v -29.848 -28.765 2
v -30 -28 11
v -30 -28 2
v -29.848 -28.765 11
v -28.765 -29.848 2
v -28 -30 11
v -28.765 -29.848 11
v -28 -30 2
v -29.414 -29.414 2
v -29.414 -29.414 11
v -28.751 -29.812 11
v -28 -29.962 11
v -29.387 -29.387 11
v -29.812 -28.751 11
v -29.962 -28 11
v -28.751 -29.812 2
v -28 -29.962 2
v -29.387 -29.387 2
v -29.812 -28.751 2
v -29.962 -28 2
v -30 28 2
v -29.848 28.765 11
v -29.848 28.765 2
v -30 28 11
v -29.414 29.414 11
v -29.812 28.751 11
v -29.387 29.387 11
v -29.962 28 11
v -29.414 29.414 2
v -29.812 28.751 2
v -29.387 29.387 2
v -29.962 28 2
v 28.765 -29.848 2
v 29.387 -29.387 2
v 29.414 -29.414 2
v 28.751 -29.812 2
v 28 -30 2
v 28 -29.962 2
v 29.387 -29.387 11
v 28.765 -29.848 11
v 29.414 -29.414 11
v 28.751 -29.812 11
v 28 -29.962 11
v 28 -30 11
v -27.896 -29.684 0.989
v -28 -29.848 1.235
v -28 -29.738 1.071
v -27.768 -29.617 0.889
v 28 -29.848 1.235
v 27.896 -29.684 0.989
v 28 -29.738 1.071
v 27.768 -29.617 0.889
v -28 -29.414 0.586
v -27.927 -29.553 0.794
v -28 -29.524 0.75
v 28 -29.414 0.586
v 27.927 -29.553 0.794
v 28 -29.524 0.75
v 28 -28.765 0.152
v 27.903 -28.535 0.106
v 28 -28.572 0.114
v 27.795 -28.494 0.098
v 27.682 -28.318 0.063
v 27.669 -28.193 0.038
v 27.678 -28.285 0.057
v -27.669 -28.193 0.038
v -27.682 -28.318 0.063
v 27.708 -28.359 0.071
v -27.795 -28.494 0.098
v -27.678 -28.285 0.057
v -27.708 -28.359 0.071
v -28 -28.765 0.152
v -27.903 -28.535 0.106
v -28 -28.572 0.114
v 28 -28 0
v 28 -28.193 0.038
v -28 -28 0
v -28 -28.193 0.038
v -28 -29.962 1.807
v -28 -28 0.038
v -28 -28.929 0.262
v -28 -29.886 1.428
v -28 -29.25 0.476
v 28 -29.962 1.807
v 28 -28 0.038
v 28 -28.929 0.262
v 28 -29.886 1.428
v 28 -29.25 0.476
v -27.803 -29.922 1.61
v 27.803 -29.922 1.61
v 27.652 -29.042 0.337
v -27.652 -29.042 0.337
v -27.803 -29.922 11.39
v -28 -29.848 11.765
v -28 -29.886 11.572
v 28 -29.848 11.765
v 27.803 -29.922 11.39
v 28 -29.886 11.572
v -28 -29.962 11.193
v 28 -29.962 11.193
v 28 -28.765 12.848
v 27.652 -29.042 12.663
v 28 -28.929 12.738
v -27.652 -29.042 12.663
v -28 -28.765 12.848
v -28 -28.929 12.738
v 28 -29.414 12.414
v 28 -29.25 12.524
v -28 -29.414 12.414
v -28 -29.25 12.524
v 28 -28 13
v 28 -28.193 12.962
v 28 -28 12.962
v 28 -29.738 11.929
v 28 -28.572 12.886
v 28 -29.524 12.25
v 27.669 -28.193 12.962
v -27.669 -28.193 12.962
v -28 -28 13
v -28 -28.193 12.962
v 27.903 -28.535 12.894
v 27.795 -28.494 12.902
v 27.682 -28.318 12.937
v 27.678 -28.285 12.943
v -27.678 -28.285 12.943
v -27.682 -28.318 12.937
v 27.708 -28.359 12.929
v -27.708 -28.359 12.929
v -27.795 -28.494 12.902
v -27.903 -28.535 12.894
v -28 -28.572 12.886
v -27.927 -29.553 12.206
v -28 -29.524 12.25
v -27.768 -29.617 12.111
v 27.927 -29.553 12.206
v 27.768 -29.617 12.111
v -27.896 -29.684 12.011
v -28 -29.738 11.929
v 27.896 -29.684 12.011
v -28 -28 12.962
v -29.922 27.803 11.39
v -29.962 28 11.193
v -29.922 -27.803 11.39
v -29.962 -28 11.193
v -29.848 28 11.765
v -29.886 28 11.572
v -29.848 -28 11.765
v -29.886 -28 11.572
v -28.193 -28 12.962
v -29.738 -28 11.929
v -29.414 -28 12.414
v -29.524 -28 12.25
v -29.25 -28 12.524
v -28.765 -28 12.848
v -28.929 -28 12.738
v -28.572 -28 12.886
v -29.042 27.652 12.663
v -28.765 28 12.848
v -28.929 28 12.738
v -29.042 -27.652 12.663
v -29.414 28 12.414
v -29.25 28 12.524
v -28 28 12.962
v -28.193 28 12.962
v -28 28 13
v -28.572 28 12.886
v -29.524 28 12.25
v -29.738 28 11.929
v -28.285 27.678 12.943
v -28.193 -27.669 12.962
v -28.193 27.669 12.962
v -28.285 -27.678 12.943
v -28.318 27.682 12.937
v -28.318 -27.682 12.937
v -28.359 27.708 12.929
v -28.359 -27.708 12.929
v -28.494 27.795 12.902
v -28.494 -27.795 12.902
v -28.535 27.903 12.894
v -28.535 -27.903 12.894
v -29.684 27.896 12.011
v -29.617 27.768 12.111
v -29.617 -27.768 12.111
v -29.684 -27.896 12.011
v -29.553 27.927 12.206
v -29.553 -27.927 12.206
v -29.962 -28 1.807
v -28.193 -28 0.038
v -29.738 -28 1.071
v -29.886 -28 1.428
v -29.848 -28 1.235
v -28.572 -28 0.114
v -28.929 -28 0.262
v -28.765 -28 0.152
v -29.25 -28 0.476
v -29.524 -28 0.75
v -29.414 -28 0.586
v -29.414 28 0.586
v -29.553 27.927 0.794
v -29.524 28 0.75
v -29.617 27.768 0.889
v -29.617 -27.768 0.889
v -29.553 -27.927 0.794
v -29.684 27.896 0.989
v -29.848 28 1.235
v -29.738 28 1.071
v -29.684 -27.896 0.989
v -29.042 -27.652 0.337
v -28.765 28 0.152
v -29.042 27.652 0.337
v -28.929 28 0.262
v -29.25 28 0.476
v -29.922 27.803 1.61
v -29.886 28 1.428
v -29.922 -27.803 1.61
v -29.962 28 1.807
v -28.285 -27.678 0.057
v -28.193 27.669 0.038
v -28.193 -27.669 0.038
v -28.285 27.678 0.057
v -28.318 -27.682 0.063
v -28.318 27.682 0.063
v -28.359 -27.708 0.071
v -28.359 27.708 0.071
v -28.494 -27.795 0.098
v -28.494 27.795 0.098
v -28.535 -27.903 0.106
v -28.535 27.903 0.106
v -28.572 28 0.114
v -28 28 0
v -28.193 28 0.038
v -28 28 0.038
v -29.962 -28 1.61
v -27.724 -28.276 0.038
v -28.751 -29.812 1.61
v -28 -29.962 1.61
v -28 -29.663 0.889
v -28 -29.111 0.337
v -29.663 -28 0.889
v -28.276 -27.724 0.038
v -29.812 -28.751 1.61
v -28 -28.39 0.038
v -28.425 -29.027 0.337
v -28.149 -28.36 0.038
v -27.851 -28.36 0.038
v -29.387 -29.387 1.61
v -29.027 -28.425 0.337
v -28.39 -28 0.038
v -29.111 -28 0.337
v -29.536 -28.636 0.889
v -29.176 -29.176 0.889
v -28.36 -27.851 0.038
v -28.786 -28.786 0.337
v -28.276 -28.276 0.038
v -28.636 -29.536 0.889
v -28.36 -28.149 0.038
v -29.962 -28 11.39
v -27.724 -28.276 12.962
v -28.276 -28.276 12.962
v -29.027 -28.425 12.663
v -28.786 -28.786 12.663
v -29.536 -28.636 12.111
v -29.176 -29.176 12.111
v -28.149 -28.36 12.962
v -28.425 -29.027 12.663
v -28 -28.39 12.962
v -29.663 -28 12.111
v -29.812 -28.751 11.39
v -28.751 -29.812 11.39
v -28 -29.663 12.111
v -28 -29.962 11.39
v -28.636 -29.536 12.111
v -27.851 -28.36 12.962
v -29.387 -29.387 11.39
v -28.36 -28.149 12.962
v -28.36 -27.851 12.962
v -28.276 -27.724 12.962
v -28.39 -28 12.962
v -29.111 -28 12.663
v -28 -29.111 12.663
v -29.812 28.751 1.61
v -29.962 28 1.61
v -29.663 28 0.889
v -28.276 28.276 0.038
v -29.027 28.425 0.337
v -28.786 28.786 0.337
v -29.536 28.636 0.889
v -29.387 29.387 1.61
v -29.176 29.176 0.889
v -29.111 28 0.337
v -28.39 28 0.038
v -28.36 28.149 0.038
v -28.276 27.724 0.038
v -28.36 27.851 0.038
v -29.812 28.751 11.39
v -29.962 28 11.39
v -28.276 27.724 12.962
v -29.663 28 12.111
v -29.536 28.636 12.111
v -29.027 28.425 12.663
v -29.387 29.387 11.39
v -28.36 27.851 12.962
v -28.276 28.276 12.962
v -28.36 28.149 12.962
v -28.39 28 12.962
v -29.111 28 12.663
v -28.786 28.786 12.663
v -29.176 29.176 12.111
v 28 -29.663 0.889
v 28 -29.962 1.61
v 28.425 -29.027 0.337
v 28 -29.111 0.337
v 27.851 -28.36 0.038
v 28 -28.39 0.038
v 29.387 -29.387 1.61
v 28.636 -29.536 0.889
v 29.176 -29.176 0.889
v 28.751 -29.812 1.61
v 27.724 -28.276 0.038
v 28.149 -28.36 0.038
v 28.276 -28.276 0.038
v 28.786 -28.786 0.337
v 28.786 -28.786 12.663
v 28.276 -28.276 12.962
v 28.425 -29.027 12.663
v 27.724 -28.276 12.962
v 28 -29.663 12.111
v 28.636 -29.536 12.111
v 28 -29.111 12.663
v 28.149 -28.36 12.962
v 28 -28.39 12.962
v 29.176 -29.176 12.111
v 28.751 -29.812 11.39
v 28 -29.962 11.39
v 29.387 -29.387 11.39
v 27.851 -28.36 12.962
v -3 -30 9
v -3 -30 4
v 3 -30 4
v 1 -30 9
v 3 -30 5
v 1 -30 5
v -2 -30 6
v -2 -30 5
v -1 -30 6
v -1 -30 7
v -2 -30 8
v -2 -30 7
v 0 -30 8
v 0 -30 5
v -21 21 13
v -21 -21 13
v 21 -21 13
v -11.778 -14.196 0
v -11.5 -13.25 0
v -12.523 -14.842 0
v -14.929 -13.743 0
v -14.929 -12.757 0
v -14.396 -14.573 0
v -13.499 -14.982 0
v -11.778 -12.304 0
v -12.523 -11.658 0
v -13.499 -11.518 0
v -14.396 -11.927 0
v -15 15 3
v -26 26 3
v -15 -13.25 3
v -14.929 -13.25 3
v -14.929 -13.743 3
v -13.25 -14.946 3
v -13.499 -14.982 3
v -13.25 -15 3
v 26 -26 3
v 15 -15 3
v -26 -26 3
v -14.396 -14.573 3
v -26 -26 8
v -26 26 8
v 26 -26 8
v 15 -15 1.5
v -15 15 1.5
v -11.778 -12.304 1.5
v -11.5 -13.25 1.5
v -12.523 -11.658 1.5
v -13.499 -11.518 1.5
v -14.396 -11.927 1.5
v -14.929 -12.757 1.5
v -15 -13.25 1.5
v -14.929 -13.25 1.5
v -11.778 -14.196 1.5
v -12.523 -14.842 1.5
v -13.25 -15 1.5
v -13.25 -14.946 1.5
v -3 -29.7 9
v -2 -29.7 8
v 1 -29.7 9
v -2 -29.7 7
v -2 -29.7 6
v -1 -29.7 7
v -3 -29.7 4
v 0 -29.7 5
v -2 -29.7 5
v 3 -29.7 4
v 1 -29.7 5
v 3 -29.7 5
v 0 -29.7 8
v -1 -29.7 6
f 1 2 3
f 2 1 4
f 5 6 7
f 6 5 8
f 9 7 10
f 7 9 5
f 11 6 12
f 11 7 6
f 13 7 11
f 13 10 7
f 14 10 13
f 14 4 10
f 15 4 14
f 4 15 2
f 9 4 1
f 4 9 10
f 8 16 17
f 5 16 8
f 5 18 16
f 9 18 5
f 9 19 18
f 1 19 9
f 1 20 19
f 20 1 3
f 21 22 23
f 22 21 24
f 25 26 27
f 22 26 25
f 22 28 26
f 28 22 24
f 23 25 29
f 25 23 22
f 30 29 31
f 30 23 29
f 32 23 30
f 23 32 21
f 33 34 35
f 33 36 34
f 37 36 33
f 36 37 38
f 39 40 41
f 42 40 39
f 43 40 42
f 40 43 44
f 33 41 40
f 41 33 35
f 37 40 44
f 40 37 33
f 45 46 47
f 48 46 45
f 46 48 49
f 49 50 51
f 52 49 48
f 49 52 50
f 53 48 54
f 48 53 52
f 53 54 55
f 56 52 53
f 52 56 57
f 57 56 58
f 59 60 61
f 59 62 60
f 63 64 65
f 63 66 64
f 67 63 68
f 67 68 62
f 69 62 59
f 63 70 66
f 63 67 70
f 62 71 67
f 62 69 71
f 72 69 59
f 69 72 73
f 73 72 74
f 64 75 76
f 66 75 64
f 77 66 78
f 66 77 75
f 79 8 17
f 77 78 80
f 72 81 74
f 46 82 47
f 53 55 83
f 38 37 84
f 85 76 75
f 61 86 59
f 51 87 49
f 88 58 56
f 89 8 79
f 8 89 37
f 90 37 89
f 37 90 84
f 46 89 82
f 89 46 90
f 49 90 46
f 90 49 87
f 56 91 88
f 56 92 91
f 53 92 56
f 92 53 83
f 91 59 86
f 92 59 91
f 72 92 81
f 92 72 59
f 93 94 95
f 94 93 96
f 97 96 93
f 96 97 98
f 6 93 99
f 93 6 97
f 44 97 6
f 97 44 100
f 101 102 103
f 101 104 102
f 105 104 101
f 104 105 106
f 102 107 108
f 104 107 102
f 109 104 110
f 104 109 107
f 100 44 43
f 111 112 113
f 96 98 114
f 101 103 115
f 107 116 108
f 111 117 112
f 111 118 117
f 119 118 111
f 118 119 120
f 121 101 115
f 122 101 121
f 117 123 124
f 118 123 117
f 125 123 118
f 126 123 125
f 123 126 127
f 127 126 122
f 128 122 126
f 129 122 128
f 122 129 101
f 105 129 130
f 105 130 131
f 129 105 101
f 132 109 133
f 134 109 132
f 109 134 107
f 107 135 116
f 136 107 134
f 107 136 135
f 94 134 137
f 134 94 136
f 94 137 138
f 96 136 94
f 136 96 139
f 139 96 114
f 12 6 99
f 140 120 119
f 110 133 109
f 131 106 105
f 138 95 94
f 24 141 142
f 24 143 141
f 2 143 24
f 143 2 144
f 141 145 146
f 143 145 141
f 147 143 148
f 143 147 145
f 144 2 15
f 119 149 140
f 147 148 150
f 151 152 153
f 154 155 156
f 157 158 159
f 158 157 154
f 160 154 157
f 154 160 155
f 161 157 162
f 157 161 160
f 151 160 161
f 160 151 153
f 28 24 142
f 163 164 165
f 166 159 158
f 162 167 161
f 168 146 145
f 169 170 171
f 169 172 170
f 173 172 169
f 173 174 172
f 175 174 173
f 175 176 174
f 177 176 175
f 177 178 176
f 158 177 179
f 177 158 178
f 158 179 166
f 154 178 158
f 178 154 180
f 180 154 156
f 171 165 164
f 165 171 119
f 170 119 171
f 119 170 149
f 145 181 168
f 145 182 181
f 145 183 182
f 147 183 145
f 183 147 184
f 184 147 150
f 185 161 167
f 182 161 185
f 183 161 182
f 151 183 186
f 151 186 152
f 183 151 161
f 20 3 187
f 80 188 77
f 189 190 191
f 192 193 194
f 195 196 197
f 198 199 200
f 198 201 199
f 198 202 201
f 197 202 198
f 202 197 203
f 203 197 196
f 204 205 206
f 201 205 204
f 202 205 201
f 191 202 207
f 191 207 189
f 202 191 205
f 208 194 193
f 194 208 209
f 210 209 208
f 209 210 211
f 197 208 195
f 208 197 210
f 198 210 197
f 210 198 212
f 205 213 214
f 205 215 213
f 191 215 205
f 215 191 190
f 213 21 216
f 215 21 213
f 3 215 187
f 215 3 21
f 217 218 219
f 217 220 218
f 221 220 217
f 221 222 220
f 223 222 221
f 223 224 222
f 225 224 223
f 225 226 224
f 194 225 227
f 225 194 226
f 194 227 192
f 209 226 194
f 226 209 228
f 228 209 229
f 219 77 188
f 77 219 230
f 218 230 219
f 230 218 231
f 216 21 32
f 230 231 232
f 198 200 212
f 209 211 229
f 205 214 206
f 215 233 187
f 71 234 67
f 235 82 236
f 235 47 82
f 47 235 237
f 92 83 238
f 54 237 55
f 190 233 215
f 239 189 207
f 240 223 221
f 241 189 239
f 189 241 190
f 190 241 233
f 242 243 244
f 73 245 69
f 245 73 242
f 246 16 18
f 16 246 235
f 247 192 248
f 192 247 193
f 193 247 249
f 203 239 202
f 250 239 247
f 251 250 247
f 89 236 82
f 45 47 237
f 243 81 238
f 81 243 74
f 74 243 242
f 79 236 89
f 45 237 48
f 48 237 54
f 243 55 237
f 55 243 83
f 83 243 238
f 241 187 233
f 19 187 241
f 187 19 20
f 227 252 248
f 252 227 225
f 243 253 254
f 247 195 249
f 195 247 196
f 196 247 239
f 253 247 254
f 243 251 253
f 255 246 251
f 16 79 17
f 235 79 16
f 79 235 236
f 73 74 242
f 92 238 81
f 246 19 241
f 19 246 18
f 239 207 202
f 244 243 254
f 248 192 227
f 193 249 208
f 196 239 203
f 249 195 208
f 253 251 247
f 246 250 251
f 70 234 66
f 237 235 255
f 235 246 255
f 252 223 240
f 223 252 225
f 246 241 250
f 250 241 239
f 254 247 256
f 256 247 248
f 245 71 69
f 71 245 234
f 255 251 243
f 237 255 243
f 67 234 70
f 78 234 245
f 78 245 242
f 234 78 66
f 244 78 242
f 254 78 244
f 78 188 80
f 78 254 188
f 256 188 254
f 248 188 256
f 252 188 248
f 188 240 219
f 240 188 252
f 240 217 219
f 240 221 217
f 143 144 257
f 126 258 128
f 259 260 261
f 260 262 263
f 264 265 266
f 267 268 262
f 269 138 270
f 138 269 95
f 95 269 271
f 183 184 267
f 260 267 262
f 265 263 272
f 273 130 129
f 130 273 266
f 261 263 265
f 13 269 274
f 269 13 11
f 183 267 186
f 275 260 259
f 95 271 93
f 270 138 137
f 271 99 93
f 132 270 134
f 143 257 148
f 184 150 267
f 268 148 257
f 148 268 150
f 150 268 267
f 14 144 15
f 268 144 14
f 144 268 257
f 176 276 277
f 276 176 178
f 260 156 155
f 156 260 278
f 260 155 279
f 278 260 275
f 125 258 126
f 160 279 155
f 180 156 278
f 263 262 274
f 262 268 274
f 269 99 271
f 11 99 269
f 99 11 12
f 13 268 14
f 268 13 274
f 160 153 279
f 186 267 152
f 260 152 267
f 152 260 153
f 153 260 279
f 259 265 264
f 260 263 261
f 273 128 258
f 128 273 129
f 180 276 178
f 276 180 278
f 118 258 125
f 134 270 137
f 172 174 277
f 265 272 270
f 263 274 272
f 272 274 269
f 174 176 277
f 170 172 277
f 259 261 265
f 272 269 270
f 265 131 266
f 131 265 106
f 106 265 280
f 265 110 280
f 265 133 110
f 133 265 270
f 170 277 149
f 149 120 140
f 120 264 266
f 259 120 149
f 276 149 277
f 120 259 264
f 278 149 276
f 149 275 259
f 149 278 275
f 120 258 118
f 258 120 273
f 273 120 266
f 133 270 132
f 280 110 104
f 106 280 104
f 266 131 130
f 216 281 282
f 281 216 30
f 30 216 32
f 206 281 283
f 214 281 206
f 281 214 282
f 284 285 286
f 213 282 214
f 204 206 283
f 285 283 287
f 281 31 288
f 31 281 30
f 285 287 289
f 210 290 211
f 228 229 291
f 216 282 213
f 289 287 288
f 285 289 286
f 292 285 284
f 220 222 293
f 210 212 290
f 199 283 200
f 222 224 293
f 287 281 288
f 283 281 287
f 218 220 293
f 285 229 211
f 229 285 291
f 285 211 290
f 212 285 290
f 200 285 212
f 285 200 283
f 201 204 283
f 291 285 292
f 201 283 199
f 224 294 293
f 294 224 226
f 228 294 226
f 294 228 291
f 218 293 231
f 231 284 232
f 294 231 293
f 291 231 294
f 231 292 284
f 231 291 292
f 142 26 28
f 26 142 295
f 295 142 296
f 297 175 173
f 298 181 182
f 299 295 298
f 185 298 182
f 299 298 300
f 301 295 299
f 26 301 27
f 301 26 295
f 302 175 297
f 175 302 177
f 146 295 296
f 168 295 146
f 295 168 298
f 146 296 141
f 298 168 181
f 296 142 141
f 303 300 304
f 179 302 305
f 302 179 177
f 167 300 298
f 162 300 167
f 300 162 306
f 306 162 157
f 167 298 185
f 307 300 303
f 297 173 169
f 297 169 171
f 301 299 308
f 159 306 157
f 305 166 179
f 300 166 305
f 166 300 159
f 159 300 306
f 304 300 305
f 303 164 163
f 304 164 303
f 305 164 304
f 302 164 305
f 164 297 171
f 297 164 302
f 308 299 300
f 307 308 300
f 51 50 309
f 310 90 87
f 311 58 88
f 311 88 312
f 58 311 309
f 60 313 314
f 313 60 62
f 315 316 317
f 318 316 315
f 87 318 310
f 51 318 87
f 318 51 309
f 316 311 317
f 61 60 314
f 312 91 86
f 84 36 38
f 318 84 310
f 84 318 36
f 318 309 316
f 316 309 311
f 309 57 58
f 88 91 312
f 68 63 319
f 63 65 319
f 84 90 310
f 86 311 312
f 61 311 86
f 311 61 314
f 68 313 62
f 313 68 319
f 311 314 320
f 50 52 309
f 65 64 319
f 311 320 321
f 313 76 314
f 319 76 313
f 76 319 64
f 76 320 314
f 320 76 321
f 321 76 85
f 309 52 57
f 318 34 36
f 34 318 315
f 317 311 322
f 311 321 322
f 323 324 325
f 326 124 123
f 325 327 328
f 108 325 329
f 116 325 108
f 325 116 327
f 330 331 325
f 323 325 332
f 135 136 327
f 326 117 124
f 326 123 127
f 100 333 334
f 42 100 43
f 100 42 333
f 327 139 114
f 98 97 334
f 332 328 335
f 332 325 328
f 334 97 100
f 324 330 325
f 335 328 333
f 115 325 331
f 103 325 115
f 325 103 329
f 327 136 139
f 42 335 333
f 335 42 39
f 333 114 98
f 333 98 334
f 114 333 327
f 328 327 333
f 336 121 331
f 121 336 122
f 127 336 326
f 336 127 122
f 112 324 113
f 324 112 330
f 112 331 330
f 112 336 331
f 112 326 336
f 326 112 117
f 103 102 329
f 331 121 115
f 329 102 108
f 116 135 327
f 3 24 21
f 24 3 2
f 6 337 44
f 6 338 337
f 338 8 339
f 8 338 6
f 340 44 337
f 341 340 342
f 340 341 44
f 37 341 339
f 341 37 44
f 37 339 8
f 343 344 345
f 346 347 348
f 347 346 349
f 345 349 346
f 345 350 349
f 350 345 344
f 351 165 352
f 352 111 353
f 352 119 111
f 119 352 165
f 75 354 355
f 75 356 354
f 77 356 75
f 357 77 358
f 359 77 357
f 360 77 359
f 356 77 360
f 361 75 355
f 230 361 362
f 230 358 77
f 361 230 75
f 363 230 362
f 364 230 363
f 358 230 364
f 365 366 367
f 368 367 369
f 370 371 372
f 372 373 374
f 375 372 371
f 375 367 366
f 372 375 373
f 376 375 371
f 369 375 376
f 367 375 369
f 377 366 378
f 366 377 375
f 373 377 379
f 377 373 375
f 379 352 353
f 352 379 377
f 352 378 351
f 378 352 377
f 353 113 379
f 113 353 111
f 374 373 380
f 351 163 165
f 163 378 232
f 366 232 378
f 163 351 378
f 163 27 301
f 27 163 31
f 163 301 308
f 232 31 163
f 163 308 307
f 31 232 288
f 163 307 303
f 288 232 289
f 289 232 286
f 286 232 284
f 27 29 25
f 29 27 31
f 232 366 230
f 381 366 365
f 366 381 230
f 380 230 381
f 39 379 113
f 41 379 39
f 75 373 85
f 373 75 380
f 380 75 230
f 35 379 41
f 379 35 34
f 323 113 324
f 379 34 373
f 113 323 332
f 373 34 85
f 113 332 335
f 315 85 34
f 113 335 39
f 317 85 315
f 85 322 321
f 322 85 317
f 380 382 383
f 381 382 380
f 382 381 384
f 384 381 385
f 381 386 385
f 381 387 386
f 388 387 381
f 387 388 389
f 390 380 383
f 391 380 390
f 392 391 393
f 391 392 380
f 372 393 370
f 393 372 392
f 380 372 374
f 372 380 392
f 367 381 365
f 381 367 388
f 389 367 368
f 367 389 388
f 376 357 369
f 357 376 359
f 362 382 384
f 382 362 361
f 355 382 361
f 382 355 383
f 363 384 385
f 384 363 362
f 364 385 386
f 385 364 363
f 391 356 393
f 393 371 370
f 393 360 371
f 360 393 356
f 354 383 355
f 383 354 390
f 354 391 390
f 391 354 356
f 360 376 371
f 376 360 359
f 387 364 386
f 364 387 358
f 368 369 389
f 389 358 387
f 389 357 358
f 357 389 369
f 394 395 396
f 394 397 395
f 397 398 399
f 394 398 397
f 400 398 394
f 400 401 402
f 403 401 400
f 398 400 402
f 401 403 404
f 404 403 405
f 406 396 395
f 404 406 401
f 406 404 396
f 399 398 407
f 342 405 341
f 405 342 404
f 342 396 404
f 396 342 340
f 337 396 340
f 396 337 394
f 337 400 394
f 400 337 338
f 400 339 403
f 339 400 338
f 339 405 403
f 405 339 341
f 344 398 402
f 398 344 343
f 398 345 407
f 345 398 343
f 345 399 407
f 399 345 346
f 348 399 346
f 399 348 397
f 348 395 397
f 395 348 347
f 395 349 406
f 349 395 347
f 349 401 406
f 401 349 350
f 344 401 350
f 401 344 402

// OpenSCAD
// Thickness of cord
T=1.5;
// Width of bracket
w=60;
// Thickness of wall
wall=4;
// Minimum thickness of picture sandwich
minT=5;
// Maximum thickness of picture sandwich
maxT=10;
// radius of rounded edges
r=2;

Dhole=T+2;

use <MCAD/boxes.scad>

difference(){
	translate([0,0,maxT/2+T])roundedBox([w,w,maxT+2*T],r,$fn=16);
	difference(){
		translate([0,0,maxT+2*T])cube([w-2*wall,w-2*wall,2*maxT],center=true);
		translate([-w/2,-w/2+wall,2*T+minT])rotate([45,0,0])cube([w,maxT,maxT]);
		translate([-w/2+wall,-w/2,2*T+minT])rotate([0,-45,0])cube([maxT,w,maxT]);
	}
	rotate([0,0,45])translate([0,-w,-1])cube(2*w);
	translate([Dhole/2,0,w/4+T])cube(w/2,center=true);
	translate([0,Dhole/2,w/4+T])cube(w/2,center=true);
	translate(-(w/4-Dhole/2)*[1,1,0])cylinder(r=Dhole/2,h=2*maxT,center=true,$fs=1);
	translate([0,-w/2,(maxT+2*T)/2])rotate([90,0,0])monogram(h=0.6);
}

module monogram(h=1)
linear_extrude(height=h,center=true)
translate(-[3,2.5])union(){
	difference(){
		square([4,5]);
		translate([1,1])square([2,3]);
	}
	square([6,1]);
	translate([0,2])square([2,1]);
}
